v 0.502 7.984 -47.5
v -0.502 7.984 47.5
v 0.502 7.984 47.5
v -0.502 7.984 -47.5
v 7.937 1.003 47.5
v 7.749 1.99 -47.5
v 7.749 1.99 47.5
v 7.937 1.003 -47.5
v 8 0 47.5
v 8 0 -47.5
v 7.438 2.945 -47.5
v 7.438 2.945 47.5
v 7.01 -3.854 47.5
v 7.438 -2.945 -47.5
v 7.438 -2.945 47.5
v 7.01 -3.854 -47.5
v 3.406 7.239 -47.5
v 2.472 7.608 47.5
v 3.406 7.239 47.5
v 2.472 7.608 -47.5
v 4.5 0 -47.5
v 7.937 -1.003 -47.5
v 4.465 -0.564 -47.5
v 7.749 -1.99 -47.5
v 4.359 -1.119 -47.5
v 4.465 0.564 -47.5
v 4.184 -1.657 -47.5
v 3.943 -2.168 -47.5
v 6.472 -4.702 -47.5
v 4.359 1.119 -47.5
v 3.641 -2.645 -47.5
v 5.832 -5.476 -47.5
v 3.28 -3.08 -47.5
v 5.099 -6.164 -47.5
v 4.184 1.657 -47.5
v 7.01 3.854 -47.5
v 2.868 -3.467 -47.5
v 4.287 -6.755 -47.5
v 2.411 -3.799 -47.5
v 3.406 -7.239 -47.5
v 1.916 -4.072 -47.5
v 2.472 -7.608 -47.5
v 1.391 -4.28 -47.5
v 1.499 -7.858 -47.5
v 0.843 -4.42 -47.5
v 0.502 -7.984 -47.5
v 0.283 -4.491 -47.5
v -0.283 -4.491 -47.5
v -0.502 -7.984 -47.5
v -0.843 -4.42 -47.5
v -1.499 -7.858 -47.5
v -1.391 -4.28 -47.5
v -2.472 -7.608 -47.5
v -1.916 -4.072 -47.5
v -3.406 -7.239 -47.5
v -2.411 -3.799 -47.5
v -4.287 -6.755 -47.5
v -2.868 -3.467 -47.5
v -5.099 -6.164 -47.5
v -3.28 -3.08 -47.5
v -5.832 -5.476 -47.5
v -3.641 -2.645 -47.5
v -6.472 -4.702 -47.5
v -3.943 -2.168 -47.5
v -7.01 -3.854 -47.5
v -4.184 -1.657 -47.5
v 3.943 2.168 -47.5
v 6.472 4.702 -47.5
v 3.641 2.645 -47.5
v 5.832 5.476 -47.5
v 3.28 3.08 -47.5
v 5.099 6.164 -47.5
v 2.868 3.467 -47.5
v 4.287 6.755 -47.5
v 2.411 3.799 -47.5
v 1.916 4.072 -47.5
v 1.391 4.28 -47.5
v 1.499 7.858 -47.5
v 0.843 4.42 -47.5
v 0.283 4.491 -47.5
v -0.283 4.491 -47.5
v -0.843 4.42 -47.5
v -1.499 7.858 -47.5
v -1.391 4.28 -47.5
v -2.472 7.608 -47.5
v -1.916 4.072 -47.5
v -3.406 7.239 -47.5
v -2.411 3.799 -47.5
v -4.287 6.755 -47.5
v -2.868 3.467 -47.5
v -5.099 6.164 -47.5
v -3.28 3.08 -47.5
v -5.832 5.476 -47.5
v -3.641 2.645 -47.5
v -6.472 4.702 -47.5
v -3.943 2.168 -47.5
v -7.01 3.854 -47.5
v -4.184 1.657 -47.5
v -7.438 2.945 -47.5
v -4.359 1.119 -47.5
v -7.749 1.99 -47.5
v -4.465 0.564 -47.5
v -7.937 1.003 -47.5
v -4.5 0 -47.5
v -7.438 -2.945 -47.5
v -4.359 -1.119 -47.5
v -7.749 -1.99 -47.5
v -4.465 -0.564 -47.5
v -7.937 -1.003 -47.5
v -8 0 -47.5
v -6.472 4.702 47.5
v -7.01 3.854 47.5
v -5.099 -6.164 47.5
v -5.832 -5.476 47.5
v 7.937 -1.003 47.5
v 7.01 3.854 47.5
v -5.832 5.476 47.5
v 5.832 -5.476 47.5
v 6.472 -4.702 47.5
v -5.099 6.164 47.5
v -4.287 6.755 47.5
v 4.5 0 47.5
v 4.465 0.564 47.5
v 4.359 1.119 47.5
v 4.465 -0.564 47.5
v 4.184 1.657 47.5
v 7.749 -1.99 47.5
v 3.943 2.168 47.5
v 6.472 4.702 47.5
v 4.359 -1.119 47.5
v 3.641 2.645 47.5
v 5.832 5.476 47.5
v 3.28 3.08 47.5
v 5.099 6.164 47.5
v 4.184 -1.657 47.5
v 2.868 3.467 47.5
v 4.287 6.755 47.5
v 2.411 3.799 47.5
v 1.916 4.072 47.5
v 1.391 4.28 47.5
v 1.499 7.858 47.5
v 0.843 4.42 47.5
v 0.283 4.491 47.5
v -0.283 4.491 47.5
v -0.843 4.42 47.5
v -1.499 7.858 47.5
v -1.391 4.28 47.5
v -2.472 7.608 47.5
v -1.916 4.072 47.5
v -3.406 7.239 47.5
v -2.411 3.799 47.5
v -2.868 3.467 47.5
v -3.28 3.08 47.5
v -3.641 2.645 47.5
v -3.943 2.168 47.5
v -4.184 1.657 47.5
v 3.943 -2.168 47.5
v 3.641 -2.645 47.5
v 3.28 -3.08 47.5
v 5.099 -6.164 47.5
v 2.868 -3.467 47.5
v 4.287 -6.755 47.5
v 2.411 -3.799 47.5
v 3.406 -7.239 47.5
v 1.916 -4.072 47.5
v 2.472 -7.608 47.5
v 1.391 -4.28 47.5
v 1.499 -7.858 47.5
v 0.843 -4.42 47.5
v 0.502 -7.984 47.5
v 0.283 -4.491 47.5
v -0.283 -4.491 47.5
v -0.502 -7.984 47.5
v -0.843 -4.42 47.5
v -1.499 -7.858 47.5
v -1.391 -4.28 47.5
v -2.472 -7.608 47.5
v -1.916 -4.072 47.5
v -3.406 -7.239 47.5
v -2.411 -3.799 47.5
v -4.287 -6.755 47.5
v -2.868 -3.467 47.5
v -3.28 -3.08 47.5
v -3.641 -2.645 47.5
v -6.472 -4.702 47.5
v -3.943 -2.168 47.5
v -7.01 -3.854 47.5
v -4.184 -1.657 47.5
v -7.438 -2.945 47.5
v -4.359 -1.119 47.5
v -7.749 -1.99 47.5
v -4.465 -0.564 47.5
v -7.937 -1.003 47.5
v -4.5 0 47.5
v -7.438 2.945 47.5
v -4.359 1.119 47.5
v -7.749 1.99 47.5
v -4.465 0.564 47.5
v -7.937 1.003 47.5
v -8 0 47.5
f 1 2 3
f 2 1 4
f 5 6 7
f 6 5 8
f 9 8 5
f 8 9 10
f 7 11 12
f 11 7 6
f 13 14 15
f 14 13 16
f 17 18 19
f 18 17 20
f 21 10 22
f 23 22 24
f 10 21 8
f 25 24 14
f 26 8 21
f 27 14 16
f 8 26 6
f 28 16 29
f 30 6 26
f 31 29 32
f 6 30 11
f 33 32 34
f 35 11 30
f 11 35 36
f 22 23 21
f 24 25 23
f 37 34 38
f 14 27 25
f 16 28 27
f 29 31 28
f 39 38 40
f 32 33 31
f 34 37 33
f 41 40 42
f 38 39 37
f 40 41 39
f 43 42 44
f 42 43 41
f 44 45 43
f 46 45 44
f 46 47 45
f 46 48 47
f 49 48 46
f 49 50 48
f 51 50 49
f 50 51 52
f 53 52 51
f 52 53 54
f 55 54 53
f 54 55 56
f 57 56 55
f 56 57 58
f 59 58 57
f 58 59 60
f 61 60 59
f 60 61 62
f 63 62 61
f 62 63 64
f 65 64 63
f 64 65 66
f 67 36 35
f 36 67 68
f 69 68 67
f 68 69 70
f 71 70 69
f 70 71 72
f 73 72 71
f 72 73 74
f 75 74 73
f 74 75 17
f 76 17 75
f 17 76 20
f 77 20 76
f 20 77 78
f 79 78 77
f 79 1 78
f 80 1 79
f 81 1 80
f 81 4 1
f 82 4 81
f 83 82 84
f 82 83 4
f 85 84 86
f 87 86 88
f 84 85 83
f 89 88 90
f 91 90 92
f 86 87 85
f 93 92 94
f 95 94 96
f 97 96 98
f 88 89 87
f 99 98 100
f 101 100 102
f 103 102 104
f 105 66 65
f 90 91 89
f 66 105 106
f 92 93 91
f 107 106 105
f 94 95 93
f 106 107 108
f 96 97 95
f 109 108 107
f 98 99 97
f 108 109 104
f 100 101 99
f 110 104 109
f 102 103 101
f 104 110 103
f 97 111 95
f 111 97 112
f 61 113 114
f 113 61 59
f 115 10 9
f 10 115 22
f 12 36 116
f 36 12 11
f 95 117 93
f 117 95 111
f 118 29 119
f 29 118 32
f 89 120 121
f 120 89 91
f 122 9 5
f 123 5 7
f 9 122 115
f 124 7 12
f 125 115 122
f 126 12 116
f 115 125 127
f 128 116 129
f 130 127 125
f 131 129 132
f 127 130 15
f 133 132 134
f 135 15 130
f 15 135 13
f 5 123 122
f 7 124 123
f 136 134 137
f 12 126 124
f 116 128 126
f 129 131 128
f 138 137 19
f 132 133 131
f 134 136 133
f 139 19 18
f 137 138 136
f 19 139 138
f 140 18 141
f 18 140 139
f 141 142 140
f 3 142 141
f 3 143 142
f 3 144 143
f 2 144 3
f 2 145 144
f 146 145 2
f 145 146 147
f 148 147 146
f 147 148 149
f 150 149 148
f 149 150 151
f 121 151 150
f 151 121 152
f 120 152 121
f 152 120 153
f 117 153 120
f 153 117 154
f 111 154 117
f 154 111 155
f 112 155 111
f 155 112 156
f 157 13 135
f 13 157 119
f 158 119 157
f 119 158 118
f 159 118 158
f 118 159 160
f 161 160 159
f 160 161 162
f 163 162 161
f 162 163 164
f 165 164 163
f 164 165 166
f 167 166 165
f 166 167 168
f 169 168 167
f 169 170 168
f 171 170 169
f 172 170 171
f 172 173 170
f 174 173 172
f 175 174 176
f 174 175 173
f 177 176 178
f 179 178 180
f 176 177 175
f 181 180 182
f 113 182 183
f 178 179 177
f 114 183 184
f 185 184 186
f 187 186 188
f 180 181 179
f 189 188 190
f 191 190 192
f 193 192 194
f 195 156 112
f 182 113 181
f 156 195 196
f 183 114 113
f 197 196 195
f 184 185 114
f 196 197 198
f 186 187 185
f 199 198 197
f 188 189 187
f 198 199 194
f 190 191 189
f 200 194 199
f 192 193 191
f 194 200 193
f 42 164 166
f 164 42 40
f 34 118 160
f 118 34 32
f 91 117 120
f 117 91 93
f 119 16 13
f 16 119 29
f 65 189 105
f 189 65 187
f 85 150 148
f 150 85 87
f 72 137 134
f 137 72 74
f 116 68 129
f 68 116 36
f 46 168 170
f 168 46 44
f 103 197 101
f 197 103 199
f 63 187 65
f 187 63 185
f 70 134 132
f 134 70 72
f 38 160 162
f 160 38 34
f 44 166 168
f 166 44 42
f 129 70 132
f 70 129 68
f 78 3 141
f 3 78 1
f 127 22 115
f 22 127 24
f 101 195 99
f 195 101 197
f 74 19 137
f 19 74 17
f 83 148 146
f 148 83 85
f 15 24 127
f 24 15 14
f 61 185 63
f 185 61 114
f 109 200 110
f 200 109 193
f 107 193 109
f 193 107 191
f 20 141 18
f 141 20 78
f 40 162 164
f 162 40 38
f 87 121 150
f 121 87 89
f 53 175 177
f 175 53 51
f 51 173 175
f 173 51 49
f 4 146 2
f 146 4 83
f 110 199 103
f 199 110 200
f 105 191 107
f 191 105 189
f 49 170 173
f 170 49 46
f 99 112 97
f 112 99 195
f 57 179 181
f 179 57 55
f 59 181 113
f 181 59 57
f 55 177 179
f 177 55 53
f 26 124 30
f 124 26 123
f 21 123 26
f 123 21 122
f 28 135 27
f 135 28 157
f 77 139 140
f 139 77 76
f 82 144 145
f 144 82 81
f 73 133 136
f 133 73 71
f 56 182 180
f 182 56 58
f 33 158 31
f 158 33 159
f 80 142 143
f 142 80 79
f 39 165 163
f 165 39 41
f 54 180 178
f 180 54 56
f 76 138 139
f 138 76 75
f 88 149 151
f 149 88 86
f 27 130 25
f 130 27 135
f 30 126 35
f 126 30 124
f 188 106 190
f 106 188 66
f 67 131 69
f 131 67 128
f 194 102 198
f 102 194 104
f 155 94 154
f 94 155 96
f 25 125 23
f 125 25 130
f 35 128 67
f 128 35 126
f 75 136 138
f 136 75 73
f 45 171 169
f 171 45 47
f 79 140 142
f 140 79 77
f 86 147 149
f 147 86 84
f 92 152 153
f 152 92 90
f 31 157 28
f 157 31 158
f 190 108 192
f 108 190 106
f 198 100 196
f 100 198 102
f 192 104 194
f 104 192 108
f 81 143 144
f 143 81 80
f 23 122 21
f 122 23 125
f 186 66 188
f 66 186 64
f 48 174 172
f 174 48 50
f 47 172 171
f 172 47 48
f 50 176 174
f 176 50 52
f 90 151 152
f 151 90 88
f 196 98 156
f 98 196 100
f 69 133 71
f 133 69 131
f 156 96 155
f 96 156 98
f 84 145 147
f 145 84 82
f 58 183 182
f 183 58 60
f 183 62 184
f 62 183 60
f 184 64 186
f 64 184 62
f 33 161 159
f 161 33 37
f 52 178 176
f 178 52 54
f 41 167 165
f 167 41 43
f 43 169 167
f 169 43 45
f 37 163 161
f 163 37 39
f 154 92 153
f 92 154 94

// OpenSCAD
$fn = 50;


difference() {
	union() {
		translate(v = [0, 0, -47.5000000000]) {
			cylinder(h = 95, r = 8.0000000000);
		}
	}
	union() {
		translate(v = [0, 0, -100.0000000000]) {
			cylinder(h = 200, r = 4.5000000000);
		}
	}
}
